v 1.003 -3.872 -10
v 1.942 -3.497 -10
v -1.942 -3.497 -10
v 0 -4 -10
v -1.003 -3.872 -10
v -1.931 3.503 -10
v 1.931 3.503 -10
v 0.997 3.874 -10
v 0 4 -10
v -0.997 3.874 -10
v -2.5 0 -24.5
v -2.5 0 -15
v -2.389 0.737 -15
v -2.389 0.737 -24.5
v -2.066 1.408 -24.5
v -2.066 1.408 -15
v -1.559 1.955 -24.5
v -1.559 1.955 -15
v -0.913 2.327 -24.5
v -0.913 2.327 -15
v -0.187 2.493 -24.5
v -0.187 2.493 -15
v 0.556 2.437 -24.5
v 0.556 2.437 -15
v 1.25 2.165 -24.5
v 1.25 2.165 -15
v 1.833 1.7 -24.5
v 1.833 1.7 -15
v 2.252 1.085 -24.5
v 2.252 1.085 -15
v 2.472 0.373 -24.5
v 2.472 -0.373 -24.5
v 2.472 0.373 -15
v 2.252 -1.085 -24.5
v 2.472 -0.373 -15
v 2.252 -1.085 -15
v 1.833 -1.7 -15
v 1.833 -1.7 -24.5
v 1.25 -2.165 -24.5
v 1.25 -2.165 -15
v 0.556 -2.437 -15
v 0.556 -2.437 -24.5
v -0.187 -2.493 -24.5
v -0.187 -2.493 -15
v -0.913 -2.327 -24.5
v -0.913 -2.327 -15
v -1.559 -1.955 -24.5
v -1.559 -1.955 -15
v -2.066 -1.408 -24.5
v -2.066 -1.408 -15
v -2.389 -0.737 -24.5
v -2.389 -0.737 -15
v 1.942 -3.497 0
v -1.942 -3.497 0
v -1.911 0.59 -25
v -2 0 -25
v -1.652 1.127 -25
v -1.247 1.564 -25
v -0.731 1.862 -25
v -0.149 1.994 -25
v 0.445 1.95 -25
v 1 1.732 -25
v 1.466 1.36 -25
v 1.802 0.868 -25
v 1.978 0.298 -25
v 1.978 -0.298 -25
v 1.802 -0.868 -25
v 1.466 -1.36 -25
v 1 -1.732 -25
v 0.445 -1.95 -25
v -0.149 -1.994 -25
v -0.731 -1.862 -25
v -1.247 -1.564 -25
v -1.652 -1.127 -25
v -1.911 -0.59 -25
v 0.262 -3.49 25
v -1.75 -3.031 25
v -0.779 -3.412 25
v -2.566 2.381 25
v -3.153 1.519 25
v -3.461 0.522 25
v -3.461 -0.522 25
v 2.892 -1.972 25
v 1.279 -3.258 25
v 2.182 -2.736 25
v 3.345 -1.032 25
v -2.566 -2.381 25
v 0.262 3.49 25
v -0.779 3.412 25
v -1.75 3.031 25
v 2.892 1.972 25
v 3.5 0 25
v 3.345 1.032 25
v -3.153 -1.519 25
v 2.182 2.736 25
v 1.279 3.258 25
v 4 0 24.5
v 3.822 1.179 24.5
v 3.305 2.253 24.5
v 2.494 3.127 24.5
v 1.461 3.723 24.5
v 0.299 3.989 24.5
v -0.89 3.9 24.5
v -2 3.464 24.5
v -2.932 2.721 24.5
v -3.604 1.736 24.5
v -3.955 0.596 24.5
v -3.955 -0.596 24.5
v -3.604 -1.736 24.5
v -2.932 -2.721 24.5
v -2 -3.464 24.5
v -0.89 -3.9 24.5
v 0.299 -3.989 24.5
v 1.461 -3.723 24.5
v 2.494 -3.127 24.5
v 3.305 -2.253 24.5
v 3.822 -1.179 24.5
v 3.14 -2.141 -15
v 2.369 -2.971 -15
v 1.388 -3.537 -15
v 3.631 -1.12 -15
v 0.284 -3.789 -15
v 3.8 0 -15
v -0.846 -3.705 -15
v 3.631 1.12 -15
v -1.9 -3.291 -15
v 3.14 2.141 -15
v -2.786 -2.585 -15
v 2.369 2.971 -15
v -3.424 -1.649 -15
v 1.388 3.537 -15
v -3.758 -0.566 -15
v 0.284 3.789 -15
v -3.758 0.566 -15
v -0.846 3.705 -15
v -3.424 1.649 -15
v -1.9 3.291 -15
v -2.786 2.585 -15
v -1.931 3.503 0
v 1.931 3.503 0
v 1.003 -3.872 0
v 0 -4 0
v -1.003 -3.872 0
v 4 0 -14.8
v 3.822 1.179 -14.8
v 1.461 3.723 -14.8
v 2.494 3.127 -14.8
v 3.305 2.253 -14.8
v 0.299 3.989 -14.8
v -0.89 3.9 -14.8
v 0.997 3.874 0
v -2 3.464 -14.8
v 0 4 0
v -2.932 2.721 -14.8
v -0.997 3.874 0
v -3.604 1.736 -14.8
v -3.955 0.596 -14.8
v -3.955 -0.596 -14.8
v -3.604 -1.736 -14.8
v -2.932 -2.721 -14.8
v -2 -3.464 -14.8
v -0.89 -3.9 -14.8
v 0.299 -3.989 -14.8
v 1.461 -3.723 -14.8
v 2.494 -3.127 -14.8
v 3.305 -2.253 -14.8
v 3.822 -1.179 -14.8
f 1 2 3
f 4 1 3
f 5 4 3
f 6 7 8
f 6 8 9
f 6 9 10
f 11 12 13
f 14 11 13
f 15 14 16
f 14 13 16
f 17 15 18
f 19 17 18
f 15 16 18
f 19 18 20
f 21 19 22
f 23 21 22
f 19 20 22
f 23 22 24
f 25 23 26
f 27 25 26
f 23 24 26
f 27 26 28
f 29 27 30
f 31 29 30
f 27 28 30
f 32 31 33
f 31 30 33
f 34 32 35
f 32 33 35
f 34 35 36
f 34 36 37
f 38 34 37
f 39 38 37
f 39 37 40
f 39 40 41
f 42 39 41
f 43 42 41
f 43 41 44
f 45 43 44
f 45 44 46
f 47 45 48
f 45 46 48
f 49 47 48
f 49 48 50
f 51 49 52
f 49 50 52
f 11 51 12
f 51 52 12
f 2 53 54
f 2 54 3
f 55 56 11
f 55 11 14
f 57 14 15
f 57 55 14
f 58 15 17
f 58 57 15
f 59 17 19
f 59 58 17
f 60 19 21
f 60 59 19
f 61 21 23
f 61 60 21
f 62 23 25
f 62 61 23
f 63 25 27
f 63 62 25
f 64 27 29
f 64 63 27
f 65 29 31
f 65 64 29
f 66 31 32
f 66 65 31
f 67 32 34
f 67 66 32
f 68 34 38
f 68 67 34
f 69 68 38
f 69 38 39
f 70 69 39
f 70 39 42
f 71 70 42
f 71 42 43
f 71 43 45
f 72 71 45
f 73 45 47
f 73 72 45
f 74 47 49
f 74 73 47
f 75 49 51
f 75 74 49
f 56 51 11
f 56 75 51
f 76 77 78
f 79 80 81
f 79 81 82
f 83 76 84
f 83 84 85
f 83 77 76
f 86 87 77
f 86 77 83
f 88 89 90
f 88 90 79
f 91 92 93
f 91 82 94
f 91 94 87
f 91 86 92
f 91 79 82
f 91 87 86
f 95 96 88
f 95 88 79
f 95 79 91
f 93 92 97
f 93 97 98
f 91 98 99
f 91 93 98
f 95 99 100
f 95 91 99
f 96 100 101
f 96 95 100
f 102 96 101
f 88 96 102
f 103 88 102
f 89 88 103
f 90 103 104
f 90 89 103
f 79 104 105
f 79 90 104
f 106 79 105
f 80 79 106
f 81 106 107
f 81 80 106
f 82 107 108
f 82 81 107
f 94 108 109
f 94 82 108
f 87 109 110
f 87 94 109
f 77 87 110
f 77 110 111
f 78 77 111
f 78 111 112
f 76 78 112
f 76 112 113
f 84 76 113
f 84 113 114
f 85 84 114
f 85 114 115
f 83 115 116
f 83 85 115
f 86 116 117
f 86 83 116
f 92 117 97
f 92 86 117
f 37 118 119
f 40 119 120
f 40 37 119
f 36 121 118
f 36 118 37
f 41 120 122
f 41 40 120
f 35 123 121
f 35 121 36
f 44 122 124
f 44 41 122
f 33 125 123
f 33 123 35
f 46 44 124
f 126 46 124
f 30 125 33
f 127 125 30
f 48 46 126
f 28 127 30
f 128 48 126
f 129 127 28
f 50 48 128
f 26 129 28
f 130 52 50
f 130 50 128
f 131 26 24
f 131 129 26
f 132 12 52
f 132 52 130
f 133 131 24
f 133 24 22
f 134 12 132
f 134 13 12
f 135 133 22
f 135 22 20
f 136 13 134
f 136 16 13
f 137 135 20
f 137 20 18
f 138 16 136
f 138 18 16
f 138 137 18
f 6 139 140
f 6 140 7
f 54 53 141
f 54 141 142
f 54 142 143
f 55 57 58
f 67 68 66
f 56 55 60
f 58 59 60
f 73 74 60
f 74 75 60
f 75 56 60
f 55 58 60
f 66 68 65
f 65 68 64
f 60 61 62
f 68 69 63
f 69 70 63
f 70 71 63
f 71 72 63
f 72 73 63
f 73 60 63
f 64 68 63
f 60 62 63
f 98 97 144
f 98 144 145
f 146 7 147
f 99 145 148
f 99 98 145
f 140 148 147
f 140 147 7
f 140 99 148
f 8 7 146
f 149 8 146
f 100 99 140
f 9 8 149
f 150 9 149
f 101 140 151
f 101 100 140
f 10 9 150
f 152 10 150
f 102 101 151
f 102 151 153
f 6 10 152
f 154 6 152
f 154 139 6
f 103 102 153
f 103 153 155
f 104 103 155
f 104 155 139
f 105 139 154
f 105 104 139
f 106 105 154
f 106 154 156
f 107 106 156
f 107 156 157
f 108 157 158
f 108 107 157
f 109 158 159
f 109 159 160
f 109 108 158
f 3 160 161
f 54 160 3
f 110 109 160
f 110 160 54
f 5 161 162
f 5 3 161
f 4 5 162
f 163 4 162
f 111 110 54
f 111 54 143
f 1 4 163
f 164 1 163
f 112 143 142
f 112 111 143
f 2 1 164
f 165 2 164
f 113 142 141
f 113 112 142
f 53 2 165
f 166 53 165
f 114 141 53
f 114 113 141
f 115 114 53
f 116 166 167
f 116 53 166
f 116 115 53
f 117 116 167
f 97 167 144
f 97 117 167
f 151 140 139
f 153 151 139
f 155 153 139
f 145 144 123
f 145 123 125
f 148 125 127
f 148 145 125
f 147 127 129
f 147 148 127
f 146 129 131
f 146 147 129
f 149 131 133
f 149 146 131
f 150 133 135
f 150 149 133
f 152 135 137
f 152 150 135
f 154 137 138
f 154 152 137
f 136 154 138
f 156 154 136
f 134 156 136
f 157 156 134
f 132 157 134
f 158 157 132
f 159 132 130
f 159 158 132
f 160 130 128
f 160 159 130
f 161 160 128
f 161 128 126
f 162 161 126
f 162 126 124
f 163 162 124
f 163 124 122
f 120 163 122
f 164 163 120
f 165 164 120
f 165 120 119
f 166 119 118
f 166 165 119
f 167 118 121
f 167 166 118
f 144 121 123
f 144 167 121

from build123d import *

# Parameters (mm, degrees)
SKETCH_1_R          = 4
EXTRUDE_1_DEPTH     = 25
CUT_EXTRUDE_START   = -10
SKETCH_2_R          = 4
SKETCH_2_R_2        = 2.5
CUT_EXTRUDE_1_DEPTH = 10
CHAMFER_1_SIZE      = 0.5
CHAMFER_2_SIZE      = 0.2
SKETCH_3_W          = 10
SKETCH_3_H          = 0.502777741
SKETCH_3_H_2        = 0.50277774
CUT_EXTRUDE_2_DEPTH = 5
CHAMFER_3_SIZE      = 0.5


with BuildPart() as part:
    # 草圖1 → 填料-伸長1 (new, symmetric)
    with BuildSketch(Plane.XY):
        Circle(SKETCH_1_R)
    extrude(amount=EXTRUDE_1_DEPTH, both=True)

    # 草圖2 → 除料-伸長1 (cut)
    with BuildSketch(Plane(origin=(0, 0, -25), x_dir=(-1, 0, 0), z_dir=(0, 0, -1)).offset(CUT_EXTRUDE_START)):
        Circle(SKETCH_2_R)
        Circle(SKETCH_2_R_2, mode=Mode.SUBTRACT)
    extrude(amount=CUT_EXTRUDE_1_DEPTH, mode=Mode.SUBTRACT)

    # 導角1
    chamfer_1_edges = [part.edges().sort_by_distance(p)[0] for p in [
        (2.5, 0, -25),
    ]]
    chamfer(chamfer_1_edges, length=CHAMFER_1_SIZE)

    # 導角2
    chamfer_2_edges = [part.edges().sort_by_distance(p)[0] for p in [
        (-4, 0, -15),
    ]]
    chamfer(chamfer_2_edges, length=CHAMFER_2_SIZE)

    # 草圖3 → 除料-伸長2 (cut, symmetric)
    with BuildSketch(Plane(origin=(0, 0, 0), x_dir=(0, 0, -1), z_dir=(1, 0, 0))):
        with Locations((5, 3.754166611)):
            Rectangle(SKETCH_3_W, SKETCH_3_H)
        with Locations((5, -3.74861113)):
            Rectangle(SKETCH_3_W, SKETCH_3_H_2)
    extrude(amount=CUT_EXTRUDE_2_DEPTH, both=True, mode=Mode.SUBTRACT)

    # 導角3
    chamfer_3_edges = [part.edges().sort_by_distance(p)[0] for p in [
        (-4, 0, 25),
    ]]
    chamfer(chamfer_3_edges, length=CHAMFER_3_SIZE)


solid = part.part
